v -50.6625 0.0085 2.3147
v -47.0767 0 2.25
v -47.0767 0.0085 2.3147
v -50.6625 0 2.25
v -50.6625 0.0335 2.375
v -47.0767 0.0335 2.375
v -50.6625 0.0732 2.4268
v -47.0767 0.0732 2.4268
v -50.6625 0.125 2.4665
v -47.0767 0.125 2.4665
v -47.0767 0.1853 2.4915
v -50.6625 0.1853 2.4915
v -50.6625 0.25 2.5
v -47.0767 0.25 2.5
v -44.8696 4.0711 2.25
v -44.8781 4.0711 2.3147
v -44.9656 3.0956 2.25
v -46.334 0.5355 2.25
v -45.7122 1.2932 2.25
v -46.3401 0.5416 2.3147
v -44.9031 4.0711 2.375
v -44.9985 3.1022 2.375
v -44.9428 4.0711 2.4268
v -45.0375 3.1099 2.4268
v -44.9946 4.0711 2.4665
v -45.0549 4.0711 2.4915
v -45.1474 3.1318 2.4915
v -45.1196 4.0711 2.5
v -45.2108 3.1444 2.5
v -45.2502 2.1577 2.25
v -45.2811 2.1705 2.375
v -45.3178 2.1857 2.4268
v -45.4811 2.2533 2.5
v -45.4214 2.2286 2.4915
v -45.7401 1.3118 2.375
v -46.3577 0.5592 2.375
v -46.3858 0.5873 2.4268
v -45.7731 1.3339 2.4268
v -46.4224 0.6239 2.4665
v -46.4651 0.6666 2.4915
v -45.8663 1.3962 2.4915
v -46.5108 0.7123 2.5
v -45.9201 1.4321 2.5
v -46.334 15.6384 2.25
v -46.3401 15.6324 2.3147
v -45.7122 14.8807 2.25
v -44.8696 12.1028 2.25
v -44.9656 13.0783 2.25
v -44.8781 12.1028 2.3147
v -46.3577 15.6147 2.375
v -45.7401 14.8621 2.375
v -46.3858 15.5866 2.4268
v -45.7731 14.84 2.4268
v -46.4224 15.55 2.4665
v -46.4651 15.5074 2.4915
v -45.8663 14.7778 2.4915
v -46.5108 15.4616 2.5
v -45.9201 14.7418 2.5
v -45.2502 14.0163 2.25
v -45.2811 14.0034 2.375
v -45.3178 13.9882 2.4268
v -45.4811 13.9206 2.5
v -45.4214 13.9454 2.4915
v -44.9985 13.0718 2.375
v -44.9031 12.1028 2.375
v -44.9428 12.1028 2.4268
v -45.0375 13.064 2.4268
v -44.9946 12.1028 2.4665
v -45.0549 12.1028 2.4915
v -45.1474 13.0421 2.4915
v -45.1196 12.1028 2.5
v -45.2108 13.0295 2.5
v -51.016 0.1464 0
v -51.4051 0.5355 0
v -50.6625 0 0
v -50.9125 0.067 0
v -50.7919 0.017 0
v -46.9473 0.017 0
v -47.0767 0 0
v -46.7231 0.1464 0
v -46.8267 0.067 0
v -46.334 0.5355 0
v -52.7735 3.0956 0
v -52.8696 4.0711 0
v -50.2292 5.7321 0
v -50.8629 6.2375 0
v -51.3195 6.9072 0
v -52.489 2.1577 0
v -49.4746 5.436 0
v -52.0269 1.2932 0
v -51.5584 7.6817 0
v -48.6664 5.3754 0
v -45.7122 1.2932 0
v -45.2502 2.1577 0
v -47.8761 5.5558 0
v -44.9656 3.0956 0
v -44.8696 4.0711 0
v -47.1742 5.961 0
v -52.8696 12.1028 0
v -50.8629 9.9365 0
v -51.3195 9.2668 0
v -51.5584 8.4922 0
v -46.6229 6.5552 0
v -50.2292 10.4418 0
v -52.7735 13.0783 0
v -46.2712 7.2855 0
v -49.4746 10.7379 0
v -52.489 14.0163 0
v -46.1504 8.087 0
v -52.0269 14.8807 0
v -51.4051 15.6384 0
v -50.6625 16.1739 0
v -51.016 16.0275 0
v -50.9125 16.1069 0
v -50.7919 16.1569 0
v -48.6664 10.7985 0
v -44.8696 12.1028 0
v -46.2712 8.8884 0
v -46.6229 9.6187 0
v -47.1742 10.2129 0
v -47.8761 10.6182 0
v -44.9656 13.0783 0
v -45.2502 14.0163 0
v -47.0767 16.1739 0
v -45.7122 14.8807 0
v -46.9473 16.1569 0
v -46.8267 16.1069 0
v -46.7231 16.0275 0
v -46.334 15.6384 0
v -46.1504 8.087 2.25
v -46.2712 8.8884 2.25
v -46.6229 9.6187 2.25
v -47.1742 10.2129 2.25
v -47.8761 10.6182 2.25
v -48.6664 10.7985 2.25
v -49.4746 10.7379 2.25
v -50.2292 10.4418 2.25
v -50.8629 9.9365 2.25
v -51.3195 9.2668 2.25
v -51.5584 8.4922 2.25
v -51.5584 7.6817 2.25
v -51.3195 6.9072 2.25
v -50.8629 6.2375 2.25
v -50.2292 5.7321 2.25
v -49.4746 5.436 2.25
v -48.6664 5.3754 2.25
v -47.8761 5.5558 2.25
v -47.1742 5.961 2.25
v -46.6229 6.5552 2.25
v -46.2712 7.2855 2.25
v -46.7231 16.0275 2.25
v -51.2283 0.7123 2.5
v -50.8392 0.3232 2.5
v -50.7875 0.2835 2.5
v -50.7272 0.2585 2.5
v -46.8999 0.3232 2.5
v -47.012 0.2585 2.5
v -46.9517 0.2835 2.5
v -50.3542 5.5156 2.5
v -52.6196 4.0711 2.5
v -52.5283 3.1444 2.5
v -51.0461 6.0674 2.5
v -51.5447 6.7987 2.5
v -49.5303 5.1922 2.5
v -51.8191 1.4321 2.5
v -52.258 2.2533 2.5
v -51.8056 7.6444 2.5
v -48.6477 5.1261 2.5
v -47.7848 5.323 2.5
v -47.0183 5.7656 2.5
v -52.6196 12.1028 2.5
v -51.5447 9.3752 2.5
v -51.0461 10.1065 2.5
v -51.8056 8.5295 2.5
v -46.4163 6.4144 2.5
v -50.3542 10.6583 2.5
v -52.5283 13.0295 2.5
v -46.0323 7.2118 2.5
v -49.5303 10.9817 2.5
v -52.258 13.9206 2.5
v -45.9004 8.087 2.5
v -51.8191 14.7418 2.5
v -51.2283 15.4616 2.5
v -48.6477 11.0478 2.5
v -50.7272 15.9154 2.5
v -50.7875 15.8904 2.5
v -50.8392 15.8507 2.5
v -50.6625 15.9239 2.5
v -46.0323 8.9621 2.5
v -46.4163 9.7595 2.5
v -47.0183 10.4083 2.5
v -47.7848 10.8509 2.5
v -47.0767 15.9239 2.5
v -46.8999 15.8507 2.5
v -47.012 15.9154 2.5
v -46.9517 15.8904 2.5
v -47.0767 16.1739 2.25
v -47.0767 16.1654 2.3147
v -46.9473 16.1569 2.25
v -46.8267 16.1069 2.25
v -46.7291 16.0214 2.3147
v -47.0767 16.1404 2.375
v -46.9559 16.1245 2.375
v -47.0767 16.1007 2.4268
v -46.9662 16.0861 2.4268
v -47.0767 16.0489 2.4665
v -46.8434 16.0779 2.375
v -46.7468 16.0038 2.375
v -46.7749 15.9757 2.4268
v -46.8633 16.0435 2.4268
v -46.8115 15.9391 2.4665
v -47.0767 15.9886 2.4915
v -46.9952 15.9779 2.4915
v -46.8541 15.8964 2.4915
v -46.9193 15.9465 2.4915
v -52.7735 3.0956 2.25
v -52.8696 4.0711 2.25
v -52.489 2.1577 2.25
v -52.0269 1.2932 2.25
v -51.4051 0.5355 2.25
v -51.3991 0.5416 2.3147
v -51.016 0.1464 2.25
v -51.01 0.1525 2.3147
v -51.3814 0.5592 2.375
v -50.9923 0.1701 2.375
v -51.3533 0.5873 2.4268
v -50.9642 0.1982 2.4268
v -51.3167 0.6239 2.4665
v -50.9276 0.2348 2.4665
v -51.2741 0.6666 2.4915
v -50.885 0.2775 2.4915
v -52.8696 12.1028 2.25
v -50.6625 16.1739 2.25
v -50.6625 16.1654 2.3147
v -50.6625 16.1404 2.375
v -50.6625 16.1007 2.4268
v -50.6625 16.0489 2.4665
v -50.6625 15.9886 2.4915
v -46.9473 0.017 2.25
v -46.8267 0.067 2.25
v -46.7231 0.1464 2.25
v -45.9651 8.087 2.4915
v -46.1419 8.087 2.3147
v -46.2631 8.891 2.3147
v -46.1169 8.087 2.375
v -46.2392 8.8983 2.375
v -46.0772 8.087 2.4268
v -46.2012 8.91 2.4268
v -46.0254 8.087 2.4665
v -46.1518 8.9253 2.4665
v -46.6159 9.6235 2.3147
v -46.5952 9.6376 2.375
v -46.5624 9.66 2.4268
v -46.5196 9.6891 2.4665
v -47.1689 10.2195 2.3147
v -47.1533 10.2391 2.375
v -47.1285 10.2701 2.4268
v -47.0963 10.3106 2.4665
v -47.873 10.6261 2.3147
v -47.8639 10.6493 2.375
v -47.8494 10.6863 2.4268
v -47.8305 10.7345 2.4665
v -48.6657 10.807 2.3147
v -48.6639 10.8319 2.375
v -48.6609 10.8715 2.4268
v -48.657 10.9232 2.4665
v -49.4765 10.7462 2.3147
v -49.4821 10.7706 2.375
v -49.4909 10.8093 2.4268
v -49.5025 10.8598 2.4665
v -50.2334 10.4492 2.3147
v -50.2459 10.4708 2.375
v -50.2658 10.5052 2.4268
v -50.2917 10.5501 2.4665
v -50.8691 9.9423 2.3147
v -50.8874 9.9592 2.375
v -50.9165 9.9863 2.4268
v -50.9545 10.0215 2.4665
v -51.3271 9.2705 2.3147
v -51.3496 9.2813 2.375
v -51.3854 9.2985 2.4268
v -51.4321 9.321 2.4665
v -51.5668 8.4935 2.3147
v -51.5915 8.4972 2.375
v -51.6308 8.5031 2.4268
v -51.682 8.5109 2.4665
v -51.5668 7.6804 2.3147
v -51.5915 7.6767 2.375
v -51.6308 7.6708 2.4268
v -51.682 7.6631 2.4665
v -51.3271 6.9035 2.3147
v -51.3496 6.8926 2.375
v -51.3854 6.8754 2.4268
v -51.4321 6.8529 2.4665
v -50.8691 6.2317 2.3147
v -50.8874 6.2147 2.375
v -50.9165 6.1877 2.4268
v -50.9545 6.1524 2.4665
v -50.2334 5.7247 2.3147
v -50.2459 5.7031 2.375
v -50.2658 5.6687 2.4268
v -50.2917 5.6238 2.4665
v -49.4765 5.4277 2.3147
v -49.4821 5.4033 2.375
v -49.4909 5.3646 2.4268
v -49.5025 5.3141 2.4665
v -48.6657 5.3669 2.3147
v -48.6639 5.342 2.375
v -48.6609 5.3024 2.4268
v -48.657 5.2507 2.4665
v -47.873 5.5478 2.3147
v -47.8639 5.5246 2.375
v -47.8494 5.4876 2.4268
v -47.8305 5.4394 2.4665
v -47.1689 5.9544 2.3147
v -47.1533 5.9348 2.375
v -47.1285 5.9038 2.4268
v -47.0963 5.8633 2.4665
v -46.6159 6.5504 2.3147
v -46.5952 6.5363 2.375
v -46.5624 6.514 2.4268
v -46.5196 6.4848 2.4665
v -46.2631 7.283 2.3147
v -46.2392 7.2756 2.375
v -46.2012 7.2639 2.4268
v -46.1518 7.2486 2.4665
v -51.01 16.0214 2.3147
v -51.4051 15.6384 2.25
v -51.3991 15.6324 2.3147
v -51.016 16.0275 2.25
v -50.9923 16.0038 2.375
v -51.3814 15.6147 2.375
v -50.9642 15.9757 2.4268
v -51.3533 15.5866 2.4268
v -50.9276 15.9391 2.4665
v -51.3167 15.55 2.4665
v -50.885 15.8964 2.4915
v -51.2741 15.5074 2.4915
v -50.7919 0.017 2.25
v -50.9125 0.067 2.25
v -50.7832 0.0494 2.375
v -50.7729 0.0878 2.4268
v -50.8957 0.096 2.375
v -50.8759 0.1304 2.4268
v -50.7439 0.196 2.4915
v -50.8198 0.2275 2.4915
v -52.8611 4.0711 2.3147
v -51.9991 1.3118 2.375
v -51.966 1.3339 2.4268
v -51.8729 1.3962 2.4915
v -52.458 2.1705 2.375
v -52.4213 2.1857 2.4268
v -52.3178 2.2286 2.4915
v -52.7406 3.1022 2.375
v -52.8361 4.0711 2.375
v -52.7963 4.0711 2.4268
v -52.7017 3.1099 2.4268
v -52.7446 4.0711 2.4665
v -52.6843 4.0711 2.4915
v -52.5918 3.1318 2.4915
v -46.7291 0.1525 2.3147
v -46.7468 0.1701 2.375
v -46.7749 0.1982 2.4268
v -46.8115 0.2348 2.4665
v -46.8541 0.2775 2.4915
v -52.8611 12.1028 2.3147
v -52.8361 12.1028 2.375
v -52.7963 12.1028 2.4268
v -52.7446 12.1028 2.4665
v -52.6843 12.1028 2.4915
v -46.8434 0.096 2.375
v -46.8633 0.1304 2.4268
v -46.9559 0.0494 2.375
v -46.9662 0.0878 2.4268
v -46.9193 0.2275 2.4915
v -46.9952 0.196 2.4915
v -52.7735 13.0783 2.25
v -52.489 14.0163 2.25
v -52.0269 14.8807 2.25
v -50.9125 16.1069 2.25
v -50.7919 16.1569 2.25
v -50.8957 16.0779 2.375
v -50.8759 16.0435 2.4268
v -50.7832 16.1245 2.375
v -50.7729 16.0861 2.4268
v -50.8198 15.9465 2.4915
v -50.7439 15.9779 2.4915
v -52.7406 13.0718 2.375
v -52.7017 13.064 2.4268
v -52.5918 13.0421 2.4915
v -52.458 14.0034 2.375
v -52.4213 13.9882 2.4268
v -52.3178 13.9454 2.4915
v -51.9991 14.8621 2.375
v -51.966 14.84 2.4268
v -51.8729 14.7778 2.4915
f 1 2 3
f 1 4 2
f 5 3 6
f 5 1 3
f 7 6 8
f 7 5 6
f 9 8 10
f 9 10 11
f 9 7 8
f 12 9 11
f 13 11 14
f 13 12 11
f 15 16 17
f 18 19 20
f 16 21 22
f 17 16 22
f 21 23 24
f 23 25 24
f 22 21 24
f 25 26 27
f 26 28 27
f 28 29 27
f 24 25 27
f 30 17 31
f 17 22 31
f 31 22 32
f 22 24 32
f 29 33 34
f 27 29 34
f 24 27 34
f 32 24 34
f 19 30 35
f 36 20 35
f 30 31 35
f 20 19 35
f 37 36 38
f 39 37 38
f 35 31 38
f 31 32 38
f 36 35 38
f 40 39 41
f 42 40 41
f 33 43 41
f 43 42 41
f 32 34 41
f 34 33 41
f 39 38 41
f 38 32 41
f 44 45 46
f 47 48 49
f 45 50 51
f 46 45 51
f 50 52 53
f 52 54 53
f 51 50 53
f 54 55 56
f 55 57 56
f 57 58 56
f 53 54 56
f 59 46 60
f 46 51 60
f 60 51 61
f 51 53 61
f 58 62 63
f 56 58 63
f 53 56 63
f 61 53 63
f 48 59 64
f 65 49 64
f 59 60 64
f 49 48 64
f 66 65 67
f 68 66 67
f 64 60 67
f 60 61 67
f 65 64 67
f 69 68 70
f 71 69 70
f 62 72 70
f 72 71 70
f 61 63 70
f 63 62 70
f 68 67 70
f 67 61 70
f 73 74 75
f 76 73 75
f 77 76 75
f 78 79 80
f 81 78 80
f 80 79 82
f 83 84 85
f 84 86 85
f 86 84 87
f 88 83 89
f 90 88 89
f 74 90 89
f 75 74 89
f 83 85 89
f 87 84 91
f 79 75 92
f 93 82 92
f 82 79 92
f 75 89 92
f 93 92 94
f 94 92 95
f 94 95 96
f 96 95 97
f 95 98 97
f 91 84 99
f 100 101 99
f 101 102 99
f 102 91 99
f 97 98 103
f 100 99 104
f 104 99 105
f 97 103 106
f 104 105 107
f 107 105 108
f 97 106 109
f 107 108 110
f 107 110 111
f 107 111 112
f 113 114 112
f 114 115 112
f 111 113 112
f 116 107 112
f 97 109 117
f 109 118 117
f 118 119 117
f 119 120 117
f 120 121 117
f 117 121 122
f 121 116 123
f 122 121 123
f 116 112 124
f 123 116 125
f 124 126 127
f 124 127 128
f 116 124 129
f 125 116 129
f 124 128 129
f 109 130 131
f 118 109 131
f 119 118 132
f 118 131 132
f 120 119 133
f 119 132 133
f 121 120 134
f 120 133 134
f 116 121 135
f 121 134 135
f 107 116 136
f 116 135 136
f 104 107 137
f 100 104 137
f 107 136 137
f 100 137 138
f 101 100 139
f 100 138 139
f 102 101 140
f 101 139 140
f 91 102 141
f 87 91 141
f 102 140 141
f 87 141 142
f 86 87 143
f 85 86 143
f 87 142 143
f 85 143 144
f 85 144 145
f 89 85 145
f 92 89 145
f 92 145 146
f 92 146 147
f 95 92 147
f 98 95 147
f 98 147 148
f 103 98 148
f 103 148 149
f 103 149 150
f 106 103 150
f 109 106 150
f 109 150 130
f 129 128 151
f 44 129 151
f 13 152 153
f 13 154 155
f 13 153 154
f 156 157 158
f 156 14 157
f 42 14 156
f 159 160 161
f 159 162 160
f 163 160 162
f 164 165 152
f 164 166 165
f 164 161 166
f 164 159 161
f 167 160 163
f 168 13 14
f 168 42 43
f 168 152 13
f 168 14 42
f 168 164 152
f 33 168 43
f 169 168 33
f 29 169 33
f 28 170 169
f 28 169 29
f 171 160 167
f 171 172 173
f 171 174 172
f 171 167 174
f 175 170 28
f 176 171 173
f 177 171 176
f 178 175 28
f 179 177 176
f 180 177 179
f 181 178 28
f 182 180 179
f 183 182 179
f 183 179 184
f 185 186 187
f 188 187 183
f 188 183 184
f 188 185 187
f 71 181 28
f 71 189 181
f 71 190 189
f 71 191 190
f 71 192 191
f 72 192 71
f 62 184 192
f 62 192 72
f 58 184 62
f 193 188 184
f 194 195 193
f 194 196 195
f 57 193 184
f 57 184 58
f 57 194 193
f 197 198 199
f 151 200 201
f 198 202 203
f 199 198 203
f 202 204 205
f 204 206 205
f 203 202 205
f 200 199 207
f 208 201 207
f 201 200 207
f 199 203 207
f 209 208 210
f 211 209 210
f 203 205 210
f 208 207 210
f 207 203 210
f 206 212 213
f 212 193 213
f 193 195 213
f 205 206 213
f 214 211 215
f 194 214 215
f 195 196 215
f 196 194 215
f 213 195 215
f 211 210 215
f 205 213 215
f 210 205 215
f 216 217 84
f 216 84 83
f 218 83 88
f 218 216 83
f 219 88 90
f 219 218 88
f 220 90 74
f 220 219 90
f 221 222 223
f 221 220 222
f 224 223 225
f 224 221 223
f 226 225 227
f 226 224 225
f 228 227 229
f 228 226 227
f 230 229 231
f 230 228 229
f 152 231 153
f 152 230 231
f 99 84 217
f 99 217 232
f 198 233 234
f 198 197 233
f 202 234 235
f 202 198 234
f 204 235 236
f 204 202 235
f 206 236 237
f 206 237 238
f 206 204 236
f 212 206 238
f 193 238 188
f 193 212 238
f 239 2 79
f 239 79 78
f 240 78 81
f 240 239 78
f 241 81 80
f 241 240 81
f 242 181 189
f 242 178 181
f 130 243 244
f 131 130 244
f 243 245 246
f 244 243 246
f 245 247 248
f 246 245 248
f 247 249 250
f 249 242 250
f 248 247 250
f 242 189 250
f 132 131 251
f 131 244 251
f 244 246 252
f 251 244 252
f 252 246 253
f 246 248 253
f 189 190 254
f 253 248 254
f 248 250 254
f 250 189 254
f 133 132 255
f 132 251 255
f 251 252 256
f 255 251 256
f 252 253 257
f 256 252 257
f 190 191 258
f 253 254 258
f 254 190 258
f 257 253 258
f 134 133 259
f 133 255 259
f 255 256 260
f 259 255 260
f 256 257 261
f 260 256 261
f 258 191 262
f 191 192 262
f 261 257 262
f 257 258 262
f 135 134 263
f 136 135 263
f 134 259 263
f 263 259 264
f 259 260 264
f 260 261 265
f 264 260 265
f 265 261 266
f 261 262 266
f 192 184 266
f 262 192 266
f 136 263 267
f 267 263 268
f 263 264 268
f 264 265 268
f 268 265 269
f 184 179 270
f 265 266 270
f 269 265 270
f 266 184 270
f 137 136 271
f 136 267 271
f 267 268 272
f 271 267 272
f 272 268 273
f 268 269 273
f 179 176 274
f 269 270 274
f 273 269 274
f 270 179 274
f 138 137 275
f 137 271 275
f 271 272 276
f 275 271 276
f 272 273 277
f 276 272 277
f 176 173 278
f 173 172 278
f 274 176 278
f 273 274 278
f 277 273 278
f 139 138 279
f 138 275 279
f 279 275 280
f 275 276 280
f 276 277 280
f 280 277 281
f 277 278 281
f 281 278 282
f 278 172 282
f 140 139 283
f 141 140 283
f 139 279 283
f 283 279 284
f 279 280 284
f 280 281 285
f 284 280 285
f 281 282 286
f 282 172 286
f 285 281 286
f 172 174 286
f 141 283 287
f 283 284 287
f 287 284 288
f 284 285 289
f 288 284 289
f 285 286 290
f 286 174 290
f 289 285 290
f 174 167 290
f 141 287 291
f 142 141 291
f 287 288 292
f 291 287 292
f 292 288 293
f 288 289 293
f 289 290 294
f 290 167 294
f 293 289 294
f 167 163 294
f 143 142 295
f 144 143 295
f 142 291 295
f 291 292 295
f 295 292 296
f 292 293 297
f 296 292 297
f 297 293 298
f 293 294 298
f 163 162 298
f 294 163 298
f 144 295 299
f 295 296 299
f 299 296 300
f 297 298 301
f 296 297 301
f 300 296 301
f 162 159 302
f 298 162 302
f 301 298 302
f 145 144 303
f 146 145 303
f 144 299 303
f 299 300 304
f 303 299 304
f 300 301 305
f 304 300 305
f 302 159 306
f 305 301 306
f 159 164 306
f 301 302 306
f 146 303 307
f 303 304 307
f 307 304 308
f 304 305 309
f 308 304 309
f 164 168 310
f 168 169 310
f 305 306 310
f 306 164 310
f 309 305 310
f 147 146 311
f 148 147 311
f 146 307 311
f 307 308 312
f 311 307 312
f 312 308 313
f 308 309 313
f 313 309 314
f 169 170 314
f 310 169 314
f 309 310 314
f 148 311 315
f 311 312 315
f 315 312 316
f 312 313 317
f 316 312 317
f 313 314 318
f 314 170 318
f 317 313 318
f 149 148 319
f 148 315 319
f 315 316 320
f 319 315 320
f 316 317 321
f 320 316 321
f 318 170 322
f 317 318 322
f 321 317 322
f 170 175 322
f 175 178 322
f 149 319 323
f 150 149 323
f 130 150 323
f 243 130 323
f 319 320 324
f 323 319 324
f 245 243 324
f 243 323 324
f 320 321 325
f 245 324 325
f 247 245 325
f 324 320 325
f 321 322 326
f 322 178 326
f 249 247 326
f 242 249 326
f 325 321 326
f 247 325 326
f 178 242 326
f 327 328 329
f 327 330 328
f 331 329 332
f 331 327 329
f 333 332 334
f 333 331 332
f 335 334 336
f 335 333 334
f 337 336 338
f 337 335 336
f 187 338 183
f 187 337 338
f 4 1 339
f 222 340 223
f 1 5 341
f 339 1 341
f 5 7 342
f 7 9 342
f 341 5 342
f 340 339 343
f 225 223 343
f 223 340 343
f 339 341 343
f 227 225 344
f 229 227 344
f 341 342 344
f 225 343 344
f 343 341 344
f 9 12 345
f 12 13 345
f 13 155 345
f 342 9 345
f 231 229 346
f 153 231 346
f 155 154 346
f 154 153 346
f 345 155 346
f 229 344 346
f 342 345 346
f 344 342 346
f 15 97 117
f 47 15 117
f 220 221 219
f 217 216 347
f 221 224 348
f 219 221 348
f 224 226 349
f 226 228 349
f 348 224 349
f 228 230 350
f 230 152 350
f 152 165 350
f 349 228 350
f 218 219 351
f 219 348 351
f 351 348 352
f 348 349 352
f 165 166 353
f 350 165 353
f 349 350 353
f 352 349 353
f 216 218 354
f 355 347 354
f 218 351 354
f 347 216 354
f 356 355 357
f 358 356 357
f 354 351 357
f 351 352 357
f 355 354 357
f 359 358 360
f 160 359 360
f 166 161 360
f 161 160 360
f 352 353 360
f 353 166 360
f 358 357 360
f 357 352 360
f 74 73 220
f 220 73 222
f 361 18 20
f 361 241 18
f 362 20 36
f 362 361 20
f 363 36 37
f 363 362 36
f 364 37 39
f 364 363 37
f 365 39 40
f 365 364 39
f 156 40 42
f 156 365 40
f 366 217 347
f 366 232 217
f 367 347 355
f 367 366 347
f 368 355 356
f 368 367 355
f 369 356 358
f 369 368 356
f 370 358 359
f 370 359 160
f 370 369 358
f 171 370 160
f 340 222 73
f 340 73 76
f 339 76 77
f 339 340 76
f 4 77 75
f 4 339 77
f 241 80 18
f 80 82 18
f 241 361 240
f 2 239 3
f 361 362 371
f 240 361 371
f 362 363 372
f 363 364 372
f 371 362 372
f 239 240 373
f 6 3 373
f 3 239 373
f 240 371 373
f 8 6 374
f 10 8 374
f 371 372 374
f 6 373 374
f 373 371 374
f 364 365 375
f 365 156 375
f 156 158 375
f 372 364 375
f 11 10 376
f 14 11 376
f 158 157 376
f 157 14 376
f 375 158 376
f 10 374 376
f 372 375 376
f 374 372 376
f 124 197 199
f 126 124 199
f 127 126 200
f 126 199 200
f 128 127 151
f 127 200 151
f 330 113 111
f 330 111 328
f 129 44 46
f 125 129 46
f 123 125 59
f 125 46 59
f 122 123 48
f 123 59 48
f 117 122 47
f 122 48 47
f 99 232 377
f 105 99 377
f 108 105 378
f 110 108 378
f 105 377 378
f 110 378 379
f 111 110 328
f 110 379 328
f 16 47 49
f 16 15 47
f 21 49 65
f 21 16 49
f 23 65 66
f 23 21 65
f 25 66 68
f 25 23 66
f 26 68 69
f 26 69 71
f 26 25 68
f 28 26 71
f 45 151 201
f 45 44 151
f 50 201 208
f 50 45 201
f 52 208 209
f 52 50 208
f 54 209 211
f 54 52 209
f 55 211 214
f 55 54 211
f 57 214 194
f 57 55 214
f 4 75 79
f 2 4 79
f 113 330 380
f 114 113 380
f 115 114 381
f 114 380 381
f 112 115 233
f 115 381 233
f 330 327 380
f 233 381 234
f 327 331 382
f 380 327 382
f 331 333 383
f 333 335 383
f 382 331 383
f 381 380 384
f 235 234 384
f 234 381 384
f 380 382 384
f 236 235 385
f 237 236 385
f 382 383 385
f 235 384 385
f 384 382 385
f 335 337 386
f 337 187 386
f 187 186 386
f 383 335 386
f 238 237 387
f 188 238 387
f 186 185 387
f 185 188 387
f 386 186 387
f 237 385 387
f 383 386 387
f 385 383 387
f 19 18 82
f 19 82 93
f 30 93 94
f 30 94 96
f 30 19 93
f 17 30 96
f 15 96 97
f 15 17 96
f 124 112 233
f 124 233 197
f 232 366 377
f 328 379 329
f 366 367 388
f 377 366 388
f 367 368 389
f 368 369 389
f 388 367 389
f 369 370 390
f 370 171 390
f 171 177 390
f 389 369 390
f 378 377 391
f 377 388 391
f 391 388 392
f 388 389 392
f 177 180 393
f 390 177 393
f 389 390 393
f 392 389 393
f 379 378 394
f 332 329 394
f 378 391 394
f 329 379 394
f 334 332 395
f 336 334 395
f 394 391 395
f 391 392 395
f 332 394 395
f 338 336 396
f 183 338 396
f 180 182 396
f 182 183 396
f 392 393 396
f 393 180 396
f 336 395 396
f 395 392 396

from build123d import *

# Parameters (mm, degrees)
F0_W     = 8
F0_H     = 16.1739148081
F1_DEPTH = 2.5
F2_SIZE  = 2
F3_R     = 5
F4_R     = 0.5
F5_R     = 2.719161288
F6_DEPTH = 25
F7_R     = 0.25


with BuildPart() as f1:
    # F0 (on Top) → F1 (new body)
    with BuildSketch(Plane.XY):
        with Locations((-48.8695710708, 8.0869574041)):
            Rectangle(F0_W, F0_H)
    extrude(amount=F1_DEPTH)

    # F2
    f2_edges = [f1.edges().sort_by_distance(p)[0] for p in [
        (-44.869571, 0, 1.25),
        (-52.869571, 0, 1.25),
        (-44.869571, 16.173915, 1.25),
        (-52.869571, 16.173915, 1.25),
    ]]
    chamfer(f2_edges, length=F2_SIZE)

    # F3
    f3_edges = [f1.edges().sort_by_distance(p)[0] for p in [
        (-52.869571, 14.173915, 1.25),
        (-52.869571, 2, 1.25),
        (-44.869571, 2, 1.25),
        (-44.869571, 14.173915, 1.25),
    ]]
    fillet(f3_edges, radius=F3_R)

    # F4
    f4_edges = [f1.edges().sort_by_distance(p)[0] for p in [
        (-50.869571, 16.173915, 1.25),
        (-46.869571, 16.173915, 1.25),
        (-46.869571, 0, 1.25),
        (-50.869571, 0, 1.25),
    ]]
    fillet(f4_edges, radius=F4_R)

    # F5 (on face) → F6 (cut)
    with BuildSketch(Plane.XY.offset(2.5)):
        with Locations((-48.8695710708, 8.0869574041)):
            Circle(F5_R)
    extrude(amount=-F6_DEPTH, mode=Mode.SUBTRACT)

    # F7
    f7_edges = [f1.edges().sort_by_distance(p)[0] for p in [
        (-51.588732, 8.086957, 2.5),
        (-52.869571, 8.086957, 2.5),
    ]]
    fillet(f7_edges, radius=F7_R)


solid = f1.part
